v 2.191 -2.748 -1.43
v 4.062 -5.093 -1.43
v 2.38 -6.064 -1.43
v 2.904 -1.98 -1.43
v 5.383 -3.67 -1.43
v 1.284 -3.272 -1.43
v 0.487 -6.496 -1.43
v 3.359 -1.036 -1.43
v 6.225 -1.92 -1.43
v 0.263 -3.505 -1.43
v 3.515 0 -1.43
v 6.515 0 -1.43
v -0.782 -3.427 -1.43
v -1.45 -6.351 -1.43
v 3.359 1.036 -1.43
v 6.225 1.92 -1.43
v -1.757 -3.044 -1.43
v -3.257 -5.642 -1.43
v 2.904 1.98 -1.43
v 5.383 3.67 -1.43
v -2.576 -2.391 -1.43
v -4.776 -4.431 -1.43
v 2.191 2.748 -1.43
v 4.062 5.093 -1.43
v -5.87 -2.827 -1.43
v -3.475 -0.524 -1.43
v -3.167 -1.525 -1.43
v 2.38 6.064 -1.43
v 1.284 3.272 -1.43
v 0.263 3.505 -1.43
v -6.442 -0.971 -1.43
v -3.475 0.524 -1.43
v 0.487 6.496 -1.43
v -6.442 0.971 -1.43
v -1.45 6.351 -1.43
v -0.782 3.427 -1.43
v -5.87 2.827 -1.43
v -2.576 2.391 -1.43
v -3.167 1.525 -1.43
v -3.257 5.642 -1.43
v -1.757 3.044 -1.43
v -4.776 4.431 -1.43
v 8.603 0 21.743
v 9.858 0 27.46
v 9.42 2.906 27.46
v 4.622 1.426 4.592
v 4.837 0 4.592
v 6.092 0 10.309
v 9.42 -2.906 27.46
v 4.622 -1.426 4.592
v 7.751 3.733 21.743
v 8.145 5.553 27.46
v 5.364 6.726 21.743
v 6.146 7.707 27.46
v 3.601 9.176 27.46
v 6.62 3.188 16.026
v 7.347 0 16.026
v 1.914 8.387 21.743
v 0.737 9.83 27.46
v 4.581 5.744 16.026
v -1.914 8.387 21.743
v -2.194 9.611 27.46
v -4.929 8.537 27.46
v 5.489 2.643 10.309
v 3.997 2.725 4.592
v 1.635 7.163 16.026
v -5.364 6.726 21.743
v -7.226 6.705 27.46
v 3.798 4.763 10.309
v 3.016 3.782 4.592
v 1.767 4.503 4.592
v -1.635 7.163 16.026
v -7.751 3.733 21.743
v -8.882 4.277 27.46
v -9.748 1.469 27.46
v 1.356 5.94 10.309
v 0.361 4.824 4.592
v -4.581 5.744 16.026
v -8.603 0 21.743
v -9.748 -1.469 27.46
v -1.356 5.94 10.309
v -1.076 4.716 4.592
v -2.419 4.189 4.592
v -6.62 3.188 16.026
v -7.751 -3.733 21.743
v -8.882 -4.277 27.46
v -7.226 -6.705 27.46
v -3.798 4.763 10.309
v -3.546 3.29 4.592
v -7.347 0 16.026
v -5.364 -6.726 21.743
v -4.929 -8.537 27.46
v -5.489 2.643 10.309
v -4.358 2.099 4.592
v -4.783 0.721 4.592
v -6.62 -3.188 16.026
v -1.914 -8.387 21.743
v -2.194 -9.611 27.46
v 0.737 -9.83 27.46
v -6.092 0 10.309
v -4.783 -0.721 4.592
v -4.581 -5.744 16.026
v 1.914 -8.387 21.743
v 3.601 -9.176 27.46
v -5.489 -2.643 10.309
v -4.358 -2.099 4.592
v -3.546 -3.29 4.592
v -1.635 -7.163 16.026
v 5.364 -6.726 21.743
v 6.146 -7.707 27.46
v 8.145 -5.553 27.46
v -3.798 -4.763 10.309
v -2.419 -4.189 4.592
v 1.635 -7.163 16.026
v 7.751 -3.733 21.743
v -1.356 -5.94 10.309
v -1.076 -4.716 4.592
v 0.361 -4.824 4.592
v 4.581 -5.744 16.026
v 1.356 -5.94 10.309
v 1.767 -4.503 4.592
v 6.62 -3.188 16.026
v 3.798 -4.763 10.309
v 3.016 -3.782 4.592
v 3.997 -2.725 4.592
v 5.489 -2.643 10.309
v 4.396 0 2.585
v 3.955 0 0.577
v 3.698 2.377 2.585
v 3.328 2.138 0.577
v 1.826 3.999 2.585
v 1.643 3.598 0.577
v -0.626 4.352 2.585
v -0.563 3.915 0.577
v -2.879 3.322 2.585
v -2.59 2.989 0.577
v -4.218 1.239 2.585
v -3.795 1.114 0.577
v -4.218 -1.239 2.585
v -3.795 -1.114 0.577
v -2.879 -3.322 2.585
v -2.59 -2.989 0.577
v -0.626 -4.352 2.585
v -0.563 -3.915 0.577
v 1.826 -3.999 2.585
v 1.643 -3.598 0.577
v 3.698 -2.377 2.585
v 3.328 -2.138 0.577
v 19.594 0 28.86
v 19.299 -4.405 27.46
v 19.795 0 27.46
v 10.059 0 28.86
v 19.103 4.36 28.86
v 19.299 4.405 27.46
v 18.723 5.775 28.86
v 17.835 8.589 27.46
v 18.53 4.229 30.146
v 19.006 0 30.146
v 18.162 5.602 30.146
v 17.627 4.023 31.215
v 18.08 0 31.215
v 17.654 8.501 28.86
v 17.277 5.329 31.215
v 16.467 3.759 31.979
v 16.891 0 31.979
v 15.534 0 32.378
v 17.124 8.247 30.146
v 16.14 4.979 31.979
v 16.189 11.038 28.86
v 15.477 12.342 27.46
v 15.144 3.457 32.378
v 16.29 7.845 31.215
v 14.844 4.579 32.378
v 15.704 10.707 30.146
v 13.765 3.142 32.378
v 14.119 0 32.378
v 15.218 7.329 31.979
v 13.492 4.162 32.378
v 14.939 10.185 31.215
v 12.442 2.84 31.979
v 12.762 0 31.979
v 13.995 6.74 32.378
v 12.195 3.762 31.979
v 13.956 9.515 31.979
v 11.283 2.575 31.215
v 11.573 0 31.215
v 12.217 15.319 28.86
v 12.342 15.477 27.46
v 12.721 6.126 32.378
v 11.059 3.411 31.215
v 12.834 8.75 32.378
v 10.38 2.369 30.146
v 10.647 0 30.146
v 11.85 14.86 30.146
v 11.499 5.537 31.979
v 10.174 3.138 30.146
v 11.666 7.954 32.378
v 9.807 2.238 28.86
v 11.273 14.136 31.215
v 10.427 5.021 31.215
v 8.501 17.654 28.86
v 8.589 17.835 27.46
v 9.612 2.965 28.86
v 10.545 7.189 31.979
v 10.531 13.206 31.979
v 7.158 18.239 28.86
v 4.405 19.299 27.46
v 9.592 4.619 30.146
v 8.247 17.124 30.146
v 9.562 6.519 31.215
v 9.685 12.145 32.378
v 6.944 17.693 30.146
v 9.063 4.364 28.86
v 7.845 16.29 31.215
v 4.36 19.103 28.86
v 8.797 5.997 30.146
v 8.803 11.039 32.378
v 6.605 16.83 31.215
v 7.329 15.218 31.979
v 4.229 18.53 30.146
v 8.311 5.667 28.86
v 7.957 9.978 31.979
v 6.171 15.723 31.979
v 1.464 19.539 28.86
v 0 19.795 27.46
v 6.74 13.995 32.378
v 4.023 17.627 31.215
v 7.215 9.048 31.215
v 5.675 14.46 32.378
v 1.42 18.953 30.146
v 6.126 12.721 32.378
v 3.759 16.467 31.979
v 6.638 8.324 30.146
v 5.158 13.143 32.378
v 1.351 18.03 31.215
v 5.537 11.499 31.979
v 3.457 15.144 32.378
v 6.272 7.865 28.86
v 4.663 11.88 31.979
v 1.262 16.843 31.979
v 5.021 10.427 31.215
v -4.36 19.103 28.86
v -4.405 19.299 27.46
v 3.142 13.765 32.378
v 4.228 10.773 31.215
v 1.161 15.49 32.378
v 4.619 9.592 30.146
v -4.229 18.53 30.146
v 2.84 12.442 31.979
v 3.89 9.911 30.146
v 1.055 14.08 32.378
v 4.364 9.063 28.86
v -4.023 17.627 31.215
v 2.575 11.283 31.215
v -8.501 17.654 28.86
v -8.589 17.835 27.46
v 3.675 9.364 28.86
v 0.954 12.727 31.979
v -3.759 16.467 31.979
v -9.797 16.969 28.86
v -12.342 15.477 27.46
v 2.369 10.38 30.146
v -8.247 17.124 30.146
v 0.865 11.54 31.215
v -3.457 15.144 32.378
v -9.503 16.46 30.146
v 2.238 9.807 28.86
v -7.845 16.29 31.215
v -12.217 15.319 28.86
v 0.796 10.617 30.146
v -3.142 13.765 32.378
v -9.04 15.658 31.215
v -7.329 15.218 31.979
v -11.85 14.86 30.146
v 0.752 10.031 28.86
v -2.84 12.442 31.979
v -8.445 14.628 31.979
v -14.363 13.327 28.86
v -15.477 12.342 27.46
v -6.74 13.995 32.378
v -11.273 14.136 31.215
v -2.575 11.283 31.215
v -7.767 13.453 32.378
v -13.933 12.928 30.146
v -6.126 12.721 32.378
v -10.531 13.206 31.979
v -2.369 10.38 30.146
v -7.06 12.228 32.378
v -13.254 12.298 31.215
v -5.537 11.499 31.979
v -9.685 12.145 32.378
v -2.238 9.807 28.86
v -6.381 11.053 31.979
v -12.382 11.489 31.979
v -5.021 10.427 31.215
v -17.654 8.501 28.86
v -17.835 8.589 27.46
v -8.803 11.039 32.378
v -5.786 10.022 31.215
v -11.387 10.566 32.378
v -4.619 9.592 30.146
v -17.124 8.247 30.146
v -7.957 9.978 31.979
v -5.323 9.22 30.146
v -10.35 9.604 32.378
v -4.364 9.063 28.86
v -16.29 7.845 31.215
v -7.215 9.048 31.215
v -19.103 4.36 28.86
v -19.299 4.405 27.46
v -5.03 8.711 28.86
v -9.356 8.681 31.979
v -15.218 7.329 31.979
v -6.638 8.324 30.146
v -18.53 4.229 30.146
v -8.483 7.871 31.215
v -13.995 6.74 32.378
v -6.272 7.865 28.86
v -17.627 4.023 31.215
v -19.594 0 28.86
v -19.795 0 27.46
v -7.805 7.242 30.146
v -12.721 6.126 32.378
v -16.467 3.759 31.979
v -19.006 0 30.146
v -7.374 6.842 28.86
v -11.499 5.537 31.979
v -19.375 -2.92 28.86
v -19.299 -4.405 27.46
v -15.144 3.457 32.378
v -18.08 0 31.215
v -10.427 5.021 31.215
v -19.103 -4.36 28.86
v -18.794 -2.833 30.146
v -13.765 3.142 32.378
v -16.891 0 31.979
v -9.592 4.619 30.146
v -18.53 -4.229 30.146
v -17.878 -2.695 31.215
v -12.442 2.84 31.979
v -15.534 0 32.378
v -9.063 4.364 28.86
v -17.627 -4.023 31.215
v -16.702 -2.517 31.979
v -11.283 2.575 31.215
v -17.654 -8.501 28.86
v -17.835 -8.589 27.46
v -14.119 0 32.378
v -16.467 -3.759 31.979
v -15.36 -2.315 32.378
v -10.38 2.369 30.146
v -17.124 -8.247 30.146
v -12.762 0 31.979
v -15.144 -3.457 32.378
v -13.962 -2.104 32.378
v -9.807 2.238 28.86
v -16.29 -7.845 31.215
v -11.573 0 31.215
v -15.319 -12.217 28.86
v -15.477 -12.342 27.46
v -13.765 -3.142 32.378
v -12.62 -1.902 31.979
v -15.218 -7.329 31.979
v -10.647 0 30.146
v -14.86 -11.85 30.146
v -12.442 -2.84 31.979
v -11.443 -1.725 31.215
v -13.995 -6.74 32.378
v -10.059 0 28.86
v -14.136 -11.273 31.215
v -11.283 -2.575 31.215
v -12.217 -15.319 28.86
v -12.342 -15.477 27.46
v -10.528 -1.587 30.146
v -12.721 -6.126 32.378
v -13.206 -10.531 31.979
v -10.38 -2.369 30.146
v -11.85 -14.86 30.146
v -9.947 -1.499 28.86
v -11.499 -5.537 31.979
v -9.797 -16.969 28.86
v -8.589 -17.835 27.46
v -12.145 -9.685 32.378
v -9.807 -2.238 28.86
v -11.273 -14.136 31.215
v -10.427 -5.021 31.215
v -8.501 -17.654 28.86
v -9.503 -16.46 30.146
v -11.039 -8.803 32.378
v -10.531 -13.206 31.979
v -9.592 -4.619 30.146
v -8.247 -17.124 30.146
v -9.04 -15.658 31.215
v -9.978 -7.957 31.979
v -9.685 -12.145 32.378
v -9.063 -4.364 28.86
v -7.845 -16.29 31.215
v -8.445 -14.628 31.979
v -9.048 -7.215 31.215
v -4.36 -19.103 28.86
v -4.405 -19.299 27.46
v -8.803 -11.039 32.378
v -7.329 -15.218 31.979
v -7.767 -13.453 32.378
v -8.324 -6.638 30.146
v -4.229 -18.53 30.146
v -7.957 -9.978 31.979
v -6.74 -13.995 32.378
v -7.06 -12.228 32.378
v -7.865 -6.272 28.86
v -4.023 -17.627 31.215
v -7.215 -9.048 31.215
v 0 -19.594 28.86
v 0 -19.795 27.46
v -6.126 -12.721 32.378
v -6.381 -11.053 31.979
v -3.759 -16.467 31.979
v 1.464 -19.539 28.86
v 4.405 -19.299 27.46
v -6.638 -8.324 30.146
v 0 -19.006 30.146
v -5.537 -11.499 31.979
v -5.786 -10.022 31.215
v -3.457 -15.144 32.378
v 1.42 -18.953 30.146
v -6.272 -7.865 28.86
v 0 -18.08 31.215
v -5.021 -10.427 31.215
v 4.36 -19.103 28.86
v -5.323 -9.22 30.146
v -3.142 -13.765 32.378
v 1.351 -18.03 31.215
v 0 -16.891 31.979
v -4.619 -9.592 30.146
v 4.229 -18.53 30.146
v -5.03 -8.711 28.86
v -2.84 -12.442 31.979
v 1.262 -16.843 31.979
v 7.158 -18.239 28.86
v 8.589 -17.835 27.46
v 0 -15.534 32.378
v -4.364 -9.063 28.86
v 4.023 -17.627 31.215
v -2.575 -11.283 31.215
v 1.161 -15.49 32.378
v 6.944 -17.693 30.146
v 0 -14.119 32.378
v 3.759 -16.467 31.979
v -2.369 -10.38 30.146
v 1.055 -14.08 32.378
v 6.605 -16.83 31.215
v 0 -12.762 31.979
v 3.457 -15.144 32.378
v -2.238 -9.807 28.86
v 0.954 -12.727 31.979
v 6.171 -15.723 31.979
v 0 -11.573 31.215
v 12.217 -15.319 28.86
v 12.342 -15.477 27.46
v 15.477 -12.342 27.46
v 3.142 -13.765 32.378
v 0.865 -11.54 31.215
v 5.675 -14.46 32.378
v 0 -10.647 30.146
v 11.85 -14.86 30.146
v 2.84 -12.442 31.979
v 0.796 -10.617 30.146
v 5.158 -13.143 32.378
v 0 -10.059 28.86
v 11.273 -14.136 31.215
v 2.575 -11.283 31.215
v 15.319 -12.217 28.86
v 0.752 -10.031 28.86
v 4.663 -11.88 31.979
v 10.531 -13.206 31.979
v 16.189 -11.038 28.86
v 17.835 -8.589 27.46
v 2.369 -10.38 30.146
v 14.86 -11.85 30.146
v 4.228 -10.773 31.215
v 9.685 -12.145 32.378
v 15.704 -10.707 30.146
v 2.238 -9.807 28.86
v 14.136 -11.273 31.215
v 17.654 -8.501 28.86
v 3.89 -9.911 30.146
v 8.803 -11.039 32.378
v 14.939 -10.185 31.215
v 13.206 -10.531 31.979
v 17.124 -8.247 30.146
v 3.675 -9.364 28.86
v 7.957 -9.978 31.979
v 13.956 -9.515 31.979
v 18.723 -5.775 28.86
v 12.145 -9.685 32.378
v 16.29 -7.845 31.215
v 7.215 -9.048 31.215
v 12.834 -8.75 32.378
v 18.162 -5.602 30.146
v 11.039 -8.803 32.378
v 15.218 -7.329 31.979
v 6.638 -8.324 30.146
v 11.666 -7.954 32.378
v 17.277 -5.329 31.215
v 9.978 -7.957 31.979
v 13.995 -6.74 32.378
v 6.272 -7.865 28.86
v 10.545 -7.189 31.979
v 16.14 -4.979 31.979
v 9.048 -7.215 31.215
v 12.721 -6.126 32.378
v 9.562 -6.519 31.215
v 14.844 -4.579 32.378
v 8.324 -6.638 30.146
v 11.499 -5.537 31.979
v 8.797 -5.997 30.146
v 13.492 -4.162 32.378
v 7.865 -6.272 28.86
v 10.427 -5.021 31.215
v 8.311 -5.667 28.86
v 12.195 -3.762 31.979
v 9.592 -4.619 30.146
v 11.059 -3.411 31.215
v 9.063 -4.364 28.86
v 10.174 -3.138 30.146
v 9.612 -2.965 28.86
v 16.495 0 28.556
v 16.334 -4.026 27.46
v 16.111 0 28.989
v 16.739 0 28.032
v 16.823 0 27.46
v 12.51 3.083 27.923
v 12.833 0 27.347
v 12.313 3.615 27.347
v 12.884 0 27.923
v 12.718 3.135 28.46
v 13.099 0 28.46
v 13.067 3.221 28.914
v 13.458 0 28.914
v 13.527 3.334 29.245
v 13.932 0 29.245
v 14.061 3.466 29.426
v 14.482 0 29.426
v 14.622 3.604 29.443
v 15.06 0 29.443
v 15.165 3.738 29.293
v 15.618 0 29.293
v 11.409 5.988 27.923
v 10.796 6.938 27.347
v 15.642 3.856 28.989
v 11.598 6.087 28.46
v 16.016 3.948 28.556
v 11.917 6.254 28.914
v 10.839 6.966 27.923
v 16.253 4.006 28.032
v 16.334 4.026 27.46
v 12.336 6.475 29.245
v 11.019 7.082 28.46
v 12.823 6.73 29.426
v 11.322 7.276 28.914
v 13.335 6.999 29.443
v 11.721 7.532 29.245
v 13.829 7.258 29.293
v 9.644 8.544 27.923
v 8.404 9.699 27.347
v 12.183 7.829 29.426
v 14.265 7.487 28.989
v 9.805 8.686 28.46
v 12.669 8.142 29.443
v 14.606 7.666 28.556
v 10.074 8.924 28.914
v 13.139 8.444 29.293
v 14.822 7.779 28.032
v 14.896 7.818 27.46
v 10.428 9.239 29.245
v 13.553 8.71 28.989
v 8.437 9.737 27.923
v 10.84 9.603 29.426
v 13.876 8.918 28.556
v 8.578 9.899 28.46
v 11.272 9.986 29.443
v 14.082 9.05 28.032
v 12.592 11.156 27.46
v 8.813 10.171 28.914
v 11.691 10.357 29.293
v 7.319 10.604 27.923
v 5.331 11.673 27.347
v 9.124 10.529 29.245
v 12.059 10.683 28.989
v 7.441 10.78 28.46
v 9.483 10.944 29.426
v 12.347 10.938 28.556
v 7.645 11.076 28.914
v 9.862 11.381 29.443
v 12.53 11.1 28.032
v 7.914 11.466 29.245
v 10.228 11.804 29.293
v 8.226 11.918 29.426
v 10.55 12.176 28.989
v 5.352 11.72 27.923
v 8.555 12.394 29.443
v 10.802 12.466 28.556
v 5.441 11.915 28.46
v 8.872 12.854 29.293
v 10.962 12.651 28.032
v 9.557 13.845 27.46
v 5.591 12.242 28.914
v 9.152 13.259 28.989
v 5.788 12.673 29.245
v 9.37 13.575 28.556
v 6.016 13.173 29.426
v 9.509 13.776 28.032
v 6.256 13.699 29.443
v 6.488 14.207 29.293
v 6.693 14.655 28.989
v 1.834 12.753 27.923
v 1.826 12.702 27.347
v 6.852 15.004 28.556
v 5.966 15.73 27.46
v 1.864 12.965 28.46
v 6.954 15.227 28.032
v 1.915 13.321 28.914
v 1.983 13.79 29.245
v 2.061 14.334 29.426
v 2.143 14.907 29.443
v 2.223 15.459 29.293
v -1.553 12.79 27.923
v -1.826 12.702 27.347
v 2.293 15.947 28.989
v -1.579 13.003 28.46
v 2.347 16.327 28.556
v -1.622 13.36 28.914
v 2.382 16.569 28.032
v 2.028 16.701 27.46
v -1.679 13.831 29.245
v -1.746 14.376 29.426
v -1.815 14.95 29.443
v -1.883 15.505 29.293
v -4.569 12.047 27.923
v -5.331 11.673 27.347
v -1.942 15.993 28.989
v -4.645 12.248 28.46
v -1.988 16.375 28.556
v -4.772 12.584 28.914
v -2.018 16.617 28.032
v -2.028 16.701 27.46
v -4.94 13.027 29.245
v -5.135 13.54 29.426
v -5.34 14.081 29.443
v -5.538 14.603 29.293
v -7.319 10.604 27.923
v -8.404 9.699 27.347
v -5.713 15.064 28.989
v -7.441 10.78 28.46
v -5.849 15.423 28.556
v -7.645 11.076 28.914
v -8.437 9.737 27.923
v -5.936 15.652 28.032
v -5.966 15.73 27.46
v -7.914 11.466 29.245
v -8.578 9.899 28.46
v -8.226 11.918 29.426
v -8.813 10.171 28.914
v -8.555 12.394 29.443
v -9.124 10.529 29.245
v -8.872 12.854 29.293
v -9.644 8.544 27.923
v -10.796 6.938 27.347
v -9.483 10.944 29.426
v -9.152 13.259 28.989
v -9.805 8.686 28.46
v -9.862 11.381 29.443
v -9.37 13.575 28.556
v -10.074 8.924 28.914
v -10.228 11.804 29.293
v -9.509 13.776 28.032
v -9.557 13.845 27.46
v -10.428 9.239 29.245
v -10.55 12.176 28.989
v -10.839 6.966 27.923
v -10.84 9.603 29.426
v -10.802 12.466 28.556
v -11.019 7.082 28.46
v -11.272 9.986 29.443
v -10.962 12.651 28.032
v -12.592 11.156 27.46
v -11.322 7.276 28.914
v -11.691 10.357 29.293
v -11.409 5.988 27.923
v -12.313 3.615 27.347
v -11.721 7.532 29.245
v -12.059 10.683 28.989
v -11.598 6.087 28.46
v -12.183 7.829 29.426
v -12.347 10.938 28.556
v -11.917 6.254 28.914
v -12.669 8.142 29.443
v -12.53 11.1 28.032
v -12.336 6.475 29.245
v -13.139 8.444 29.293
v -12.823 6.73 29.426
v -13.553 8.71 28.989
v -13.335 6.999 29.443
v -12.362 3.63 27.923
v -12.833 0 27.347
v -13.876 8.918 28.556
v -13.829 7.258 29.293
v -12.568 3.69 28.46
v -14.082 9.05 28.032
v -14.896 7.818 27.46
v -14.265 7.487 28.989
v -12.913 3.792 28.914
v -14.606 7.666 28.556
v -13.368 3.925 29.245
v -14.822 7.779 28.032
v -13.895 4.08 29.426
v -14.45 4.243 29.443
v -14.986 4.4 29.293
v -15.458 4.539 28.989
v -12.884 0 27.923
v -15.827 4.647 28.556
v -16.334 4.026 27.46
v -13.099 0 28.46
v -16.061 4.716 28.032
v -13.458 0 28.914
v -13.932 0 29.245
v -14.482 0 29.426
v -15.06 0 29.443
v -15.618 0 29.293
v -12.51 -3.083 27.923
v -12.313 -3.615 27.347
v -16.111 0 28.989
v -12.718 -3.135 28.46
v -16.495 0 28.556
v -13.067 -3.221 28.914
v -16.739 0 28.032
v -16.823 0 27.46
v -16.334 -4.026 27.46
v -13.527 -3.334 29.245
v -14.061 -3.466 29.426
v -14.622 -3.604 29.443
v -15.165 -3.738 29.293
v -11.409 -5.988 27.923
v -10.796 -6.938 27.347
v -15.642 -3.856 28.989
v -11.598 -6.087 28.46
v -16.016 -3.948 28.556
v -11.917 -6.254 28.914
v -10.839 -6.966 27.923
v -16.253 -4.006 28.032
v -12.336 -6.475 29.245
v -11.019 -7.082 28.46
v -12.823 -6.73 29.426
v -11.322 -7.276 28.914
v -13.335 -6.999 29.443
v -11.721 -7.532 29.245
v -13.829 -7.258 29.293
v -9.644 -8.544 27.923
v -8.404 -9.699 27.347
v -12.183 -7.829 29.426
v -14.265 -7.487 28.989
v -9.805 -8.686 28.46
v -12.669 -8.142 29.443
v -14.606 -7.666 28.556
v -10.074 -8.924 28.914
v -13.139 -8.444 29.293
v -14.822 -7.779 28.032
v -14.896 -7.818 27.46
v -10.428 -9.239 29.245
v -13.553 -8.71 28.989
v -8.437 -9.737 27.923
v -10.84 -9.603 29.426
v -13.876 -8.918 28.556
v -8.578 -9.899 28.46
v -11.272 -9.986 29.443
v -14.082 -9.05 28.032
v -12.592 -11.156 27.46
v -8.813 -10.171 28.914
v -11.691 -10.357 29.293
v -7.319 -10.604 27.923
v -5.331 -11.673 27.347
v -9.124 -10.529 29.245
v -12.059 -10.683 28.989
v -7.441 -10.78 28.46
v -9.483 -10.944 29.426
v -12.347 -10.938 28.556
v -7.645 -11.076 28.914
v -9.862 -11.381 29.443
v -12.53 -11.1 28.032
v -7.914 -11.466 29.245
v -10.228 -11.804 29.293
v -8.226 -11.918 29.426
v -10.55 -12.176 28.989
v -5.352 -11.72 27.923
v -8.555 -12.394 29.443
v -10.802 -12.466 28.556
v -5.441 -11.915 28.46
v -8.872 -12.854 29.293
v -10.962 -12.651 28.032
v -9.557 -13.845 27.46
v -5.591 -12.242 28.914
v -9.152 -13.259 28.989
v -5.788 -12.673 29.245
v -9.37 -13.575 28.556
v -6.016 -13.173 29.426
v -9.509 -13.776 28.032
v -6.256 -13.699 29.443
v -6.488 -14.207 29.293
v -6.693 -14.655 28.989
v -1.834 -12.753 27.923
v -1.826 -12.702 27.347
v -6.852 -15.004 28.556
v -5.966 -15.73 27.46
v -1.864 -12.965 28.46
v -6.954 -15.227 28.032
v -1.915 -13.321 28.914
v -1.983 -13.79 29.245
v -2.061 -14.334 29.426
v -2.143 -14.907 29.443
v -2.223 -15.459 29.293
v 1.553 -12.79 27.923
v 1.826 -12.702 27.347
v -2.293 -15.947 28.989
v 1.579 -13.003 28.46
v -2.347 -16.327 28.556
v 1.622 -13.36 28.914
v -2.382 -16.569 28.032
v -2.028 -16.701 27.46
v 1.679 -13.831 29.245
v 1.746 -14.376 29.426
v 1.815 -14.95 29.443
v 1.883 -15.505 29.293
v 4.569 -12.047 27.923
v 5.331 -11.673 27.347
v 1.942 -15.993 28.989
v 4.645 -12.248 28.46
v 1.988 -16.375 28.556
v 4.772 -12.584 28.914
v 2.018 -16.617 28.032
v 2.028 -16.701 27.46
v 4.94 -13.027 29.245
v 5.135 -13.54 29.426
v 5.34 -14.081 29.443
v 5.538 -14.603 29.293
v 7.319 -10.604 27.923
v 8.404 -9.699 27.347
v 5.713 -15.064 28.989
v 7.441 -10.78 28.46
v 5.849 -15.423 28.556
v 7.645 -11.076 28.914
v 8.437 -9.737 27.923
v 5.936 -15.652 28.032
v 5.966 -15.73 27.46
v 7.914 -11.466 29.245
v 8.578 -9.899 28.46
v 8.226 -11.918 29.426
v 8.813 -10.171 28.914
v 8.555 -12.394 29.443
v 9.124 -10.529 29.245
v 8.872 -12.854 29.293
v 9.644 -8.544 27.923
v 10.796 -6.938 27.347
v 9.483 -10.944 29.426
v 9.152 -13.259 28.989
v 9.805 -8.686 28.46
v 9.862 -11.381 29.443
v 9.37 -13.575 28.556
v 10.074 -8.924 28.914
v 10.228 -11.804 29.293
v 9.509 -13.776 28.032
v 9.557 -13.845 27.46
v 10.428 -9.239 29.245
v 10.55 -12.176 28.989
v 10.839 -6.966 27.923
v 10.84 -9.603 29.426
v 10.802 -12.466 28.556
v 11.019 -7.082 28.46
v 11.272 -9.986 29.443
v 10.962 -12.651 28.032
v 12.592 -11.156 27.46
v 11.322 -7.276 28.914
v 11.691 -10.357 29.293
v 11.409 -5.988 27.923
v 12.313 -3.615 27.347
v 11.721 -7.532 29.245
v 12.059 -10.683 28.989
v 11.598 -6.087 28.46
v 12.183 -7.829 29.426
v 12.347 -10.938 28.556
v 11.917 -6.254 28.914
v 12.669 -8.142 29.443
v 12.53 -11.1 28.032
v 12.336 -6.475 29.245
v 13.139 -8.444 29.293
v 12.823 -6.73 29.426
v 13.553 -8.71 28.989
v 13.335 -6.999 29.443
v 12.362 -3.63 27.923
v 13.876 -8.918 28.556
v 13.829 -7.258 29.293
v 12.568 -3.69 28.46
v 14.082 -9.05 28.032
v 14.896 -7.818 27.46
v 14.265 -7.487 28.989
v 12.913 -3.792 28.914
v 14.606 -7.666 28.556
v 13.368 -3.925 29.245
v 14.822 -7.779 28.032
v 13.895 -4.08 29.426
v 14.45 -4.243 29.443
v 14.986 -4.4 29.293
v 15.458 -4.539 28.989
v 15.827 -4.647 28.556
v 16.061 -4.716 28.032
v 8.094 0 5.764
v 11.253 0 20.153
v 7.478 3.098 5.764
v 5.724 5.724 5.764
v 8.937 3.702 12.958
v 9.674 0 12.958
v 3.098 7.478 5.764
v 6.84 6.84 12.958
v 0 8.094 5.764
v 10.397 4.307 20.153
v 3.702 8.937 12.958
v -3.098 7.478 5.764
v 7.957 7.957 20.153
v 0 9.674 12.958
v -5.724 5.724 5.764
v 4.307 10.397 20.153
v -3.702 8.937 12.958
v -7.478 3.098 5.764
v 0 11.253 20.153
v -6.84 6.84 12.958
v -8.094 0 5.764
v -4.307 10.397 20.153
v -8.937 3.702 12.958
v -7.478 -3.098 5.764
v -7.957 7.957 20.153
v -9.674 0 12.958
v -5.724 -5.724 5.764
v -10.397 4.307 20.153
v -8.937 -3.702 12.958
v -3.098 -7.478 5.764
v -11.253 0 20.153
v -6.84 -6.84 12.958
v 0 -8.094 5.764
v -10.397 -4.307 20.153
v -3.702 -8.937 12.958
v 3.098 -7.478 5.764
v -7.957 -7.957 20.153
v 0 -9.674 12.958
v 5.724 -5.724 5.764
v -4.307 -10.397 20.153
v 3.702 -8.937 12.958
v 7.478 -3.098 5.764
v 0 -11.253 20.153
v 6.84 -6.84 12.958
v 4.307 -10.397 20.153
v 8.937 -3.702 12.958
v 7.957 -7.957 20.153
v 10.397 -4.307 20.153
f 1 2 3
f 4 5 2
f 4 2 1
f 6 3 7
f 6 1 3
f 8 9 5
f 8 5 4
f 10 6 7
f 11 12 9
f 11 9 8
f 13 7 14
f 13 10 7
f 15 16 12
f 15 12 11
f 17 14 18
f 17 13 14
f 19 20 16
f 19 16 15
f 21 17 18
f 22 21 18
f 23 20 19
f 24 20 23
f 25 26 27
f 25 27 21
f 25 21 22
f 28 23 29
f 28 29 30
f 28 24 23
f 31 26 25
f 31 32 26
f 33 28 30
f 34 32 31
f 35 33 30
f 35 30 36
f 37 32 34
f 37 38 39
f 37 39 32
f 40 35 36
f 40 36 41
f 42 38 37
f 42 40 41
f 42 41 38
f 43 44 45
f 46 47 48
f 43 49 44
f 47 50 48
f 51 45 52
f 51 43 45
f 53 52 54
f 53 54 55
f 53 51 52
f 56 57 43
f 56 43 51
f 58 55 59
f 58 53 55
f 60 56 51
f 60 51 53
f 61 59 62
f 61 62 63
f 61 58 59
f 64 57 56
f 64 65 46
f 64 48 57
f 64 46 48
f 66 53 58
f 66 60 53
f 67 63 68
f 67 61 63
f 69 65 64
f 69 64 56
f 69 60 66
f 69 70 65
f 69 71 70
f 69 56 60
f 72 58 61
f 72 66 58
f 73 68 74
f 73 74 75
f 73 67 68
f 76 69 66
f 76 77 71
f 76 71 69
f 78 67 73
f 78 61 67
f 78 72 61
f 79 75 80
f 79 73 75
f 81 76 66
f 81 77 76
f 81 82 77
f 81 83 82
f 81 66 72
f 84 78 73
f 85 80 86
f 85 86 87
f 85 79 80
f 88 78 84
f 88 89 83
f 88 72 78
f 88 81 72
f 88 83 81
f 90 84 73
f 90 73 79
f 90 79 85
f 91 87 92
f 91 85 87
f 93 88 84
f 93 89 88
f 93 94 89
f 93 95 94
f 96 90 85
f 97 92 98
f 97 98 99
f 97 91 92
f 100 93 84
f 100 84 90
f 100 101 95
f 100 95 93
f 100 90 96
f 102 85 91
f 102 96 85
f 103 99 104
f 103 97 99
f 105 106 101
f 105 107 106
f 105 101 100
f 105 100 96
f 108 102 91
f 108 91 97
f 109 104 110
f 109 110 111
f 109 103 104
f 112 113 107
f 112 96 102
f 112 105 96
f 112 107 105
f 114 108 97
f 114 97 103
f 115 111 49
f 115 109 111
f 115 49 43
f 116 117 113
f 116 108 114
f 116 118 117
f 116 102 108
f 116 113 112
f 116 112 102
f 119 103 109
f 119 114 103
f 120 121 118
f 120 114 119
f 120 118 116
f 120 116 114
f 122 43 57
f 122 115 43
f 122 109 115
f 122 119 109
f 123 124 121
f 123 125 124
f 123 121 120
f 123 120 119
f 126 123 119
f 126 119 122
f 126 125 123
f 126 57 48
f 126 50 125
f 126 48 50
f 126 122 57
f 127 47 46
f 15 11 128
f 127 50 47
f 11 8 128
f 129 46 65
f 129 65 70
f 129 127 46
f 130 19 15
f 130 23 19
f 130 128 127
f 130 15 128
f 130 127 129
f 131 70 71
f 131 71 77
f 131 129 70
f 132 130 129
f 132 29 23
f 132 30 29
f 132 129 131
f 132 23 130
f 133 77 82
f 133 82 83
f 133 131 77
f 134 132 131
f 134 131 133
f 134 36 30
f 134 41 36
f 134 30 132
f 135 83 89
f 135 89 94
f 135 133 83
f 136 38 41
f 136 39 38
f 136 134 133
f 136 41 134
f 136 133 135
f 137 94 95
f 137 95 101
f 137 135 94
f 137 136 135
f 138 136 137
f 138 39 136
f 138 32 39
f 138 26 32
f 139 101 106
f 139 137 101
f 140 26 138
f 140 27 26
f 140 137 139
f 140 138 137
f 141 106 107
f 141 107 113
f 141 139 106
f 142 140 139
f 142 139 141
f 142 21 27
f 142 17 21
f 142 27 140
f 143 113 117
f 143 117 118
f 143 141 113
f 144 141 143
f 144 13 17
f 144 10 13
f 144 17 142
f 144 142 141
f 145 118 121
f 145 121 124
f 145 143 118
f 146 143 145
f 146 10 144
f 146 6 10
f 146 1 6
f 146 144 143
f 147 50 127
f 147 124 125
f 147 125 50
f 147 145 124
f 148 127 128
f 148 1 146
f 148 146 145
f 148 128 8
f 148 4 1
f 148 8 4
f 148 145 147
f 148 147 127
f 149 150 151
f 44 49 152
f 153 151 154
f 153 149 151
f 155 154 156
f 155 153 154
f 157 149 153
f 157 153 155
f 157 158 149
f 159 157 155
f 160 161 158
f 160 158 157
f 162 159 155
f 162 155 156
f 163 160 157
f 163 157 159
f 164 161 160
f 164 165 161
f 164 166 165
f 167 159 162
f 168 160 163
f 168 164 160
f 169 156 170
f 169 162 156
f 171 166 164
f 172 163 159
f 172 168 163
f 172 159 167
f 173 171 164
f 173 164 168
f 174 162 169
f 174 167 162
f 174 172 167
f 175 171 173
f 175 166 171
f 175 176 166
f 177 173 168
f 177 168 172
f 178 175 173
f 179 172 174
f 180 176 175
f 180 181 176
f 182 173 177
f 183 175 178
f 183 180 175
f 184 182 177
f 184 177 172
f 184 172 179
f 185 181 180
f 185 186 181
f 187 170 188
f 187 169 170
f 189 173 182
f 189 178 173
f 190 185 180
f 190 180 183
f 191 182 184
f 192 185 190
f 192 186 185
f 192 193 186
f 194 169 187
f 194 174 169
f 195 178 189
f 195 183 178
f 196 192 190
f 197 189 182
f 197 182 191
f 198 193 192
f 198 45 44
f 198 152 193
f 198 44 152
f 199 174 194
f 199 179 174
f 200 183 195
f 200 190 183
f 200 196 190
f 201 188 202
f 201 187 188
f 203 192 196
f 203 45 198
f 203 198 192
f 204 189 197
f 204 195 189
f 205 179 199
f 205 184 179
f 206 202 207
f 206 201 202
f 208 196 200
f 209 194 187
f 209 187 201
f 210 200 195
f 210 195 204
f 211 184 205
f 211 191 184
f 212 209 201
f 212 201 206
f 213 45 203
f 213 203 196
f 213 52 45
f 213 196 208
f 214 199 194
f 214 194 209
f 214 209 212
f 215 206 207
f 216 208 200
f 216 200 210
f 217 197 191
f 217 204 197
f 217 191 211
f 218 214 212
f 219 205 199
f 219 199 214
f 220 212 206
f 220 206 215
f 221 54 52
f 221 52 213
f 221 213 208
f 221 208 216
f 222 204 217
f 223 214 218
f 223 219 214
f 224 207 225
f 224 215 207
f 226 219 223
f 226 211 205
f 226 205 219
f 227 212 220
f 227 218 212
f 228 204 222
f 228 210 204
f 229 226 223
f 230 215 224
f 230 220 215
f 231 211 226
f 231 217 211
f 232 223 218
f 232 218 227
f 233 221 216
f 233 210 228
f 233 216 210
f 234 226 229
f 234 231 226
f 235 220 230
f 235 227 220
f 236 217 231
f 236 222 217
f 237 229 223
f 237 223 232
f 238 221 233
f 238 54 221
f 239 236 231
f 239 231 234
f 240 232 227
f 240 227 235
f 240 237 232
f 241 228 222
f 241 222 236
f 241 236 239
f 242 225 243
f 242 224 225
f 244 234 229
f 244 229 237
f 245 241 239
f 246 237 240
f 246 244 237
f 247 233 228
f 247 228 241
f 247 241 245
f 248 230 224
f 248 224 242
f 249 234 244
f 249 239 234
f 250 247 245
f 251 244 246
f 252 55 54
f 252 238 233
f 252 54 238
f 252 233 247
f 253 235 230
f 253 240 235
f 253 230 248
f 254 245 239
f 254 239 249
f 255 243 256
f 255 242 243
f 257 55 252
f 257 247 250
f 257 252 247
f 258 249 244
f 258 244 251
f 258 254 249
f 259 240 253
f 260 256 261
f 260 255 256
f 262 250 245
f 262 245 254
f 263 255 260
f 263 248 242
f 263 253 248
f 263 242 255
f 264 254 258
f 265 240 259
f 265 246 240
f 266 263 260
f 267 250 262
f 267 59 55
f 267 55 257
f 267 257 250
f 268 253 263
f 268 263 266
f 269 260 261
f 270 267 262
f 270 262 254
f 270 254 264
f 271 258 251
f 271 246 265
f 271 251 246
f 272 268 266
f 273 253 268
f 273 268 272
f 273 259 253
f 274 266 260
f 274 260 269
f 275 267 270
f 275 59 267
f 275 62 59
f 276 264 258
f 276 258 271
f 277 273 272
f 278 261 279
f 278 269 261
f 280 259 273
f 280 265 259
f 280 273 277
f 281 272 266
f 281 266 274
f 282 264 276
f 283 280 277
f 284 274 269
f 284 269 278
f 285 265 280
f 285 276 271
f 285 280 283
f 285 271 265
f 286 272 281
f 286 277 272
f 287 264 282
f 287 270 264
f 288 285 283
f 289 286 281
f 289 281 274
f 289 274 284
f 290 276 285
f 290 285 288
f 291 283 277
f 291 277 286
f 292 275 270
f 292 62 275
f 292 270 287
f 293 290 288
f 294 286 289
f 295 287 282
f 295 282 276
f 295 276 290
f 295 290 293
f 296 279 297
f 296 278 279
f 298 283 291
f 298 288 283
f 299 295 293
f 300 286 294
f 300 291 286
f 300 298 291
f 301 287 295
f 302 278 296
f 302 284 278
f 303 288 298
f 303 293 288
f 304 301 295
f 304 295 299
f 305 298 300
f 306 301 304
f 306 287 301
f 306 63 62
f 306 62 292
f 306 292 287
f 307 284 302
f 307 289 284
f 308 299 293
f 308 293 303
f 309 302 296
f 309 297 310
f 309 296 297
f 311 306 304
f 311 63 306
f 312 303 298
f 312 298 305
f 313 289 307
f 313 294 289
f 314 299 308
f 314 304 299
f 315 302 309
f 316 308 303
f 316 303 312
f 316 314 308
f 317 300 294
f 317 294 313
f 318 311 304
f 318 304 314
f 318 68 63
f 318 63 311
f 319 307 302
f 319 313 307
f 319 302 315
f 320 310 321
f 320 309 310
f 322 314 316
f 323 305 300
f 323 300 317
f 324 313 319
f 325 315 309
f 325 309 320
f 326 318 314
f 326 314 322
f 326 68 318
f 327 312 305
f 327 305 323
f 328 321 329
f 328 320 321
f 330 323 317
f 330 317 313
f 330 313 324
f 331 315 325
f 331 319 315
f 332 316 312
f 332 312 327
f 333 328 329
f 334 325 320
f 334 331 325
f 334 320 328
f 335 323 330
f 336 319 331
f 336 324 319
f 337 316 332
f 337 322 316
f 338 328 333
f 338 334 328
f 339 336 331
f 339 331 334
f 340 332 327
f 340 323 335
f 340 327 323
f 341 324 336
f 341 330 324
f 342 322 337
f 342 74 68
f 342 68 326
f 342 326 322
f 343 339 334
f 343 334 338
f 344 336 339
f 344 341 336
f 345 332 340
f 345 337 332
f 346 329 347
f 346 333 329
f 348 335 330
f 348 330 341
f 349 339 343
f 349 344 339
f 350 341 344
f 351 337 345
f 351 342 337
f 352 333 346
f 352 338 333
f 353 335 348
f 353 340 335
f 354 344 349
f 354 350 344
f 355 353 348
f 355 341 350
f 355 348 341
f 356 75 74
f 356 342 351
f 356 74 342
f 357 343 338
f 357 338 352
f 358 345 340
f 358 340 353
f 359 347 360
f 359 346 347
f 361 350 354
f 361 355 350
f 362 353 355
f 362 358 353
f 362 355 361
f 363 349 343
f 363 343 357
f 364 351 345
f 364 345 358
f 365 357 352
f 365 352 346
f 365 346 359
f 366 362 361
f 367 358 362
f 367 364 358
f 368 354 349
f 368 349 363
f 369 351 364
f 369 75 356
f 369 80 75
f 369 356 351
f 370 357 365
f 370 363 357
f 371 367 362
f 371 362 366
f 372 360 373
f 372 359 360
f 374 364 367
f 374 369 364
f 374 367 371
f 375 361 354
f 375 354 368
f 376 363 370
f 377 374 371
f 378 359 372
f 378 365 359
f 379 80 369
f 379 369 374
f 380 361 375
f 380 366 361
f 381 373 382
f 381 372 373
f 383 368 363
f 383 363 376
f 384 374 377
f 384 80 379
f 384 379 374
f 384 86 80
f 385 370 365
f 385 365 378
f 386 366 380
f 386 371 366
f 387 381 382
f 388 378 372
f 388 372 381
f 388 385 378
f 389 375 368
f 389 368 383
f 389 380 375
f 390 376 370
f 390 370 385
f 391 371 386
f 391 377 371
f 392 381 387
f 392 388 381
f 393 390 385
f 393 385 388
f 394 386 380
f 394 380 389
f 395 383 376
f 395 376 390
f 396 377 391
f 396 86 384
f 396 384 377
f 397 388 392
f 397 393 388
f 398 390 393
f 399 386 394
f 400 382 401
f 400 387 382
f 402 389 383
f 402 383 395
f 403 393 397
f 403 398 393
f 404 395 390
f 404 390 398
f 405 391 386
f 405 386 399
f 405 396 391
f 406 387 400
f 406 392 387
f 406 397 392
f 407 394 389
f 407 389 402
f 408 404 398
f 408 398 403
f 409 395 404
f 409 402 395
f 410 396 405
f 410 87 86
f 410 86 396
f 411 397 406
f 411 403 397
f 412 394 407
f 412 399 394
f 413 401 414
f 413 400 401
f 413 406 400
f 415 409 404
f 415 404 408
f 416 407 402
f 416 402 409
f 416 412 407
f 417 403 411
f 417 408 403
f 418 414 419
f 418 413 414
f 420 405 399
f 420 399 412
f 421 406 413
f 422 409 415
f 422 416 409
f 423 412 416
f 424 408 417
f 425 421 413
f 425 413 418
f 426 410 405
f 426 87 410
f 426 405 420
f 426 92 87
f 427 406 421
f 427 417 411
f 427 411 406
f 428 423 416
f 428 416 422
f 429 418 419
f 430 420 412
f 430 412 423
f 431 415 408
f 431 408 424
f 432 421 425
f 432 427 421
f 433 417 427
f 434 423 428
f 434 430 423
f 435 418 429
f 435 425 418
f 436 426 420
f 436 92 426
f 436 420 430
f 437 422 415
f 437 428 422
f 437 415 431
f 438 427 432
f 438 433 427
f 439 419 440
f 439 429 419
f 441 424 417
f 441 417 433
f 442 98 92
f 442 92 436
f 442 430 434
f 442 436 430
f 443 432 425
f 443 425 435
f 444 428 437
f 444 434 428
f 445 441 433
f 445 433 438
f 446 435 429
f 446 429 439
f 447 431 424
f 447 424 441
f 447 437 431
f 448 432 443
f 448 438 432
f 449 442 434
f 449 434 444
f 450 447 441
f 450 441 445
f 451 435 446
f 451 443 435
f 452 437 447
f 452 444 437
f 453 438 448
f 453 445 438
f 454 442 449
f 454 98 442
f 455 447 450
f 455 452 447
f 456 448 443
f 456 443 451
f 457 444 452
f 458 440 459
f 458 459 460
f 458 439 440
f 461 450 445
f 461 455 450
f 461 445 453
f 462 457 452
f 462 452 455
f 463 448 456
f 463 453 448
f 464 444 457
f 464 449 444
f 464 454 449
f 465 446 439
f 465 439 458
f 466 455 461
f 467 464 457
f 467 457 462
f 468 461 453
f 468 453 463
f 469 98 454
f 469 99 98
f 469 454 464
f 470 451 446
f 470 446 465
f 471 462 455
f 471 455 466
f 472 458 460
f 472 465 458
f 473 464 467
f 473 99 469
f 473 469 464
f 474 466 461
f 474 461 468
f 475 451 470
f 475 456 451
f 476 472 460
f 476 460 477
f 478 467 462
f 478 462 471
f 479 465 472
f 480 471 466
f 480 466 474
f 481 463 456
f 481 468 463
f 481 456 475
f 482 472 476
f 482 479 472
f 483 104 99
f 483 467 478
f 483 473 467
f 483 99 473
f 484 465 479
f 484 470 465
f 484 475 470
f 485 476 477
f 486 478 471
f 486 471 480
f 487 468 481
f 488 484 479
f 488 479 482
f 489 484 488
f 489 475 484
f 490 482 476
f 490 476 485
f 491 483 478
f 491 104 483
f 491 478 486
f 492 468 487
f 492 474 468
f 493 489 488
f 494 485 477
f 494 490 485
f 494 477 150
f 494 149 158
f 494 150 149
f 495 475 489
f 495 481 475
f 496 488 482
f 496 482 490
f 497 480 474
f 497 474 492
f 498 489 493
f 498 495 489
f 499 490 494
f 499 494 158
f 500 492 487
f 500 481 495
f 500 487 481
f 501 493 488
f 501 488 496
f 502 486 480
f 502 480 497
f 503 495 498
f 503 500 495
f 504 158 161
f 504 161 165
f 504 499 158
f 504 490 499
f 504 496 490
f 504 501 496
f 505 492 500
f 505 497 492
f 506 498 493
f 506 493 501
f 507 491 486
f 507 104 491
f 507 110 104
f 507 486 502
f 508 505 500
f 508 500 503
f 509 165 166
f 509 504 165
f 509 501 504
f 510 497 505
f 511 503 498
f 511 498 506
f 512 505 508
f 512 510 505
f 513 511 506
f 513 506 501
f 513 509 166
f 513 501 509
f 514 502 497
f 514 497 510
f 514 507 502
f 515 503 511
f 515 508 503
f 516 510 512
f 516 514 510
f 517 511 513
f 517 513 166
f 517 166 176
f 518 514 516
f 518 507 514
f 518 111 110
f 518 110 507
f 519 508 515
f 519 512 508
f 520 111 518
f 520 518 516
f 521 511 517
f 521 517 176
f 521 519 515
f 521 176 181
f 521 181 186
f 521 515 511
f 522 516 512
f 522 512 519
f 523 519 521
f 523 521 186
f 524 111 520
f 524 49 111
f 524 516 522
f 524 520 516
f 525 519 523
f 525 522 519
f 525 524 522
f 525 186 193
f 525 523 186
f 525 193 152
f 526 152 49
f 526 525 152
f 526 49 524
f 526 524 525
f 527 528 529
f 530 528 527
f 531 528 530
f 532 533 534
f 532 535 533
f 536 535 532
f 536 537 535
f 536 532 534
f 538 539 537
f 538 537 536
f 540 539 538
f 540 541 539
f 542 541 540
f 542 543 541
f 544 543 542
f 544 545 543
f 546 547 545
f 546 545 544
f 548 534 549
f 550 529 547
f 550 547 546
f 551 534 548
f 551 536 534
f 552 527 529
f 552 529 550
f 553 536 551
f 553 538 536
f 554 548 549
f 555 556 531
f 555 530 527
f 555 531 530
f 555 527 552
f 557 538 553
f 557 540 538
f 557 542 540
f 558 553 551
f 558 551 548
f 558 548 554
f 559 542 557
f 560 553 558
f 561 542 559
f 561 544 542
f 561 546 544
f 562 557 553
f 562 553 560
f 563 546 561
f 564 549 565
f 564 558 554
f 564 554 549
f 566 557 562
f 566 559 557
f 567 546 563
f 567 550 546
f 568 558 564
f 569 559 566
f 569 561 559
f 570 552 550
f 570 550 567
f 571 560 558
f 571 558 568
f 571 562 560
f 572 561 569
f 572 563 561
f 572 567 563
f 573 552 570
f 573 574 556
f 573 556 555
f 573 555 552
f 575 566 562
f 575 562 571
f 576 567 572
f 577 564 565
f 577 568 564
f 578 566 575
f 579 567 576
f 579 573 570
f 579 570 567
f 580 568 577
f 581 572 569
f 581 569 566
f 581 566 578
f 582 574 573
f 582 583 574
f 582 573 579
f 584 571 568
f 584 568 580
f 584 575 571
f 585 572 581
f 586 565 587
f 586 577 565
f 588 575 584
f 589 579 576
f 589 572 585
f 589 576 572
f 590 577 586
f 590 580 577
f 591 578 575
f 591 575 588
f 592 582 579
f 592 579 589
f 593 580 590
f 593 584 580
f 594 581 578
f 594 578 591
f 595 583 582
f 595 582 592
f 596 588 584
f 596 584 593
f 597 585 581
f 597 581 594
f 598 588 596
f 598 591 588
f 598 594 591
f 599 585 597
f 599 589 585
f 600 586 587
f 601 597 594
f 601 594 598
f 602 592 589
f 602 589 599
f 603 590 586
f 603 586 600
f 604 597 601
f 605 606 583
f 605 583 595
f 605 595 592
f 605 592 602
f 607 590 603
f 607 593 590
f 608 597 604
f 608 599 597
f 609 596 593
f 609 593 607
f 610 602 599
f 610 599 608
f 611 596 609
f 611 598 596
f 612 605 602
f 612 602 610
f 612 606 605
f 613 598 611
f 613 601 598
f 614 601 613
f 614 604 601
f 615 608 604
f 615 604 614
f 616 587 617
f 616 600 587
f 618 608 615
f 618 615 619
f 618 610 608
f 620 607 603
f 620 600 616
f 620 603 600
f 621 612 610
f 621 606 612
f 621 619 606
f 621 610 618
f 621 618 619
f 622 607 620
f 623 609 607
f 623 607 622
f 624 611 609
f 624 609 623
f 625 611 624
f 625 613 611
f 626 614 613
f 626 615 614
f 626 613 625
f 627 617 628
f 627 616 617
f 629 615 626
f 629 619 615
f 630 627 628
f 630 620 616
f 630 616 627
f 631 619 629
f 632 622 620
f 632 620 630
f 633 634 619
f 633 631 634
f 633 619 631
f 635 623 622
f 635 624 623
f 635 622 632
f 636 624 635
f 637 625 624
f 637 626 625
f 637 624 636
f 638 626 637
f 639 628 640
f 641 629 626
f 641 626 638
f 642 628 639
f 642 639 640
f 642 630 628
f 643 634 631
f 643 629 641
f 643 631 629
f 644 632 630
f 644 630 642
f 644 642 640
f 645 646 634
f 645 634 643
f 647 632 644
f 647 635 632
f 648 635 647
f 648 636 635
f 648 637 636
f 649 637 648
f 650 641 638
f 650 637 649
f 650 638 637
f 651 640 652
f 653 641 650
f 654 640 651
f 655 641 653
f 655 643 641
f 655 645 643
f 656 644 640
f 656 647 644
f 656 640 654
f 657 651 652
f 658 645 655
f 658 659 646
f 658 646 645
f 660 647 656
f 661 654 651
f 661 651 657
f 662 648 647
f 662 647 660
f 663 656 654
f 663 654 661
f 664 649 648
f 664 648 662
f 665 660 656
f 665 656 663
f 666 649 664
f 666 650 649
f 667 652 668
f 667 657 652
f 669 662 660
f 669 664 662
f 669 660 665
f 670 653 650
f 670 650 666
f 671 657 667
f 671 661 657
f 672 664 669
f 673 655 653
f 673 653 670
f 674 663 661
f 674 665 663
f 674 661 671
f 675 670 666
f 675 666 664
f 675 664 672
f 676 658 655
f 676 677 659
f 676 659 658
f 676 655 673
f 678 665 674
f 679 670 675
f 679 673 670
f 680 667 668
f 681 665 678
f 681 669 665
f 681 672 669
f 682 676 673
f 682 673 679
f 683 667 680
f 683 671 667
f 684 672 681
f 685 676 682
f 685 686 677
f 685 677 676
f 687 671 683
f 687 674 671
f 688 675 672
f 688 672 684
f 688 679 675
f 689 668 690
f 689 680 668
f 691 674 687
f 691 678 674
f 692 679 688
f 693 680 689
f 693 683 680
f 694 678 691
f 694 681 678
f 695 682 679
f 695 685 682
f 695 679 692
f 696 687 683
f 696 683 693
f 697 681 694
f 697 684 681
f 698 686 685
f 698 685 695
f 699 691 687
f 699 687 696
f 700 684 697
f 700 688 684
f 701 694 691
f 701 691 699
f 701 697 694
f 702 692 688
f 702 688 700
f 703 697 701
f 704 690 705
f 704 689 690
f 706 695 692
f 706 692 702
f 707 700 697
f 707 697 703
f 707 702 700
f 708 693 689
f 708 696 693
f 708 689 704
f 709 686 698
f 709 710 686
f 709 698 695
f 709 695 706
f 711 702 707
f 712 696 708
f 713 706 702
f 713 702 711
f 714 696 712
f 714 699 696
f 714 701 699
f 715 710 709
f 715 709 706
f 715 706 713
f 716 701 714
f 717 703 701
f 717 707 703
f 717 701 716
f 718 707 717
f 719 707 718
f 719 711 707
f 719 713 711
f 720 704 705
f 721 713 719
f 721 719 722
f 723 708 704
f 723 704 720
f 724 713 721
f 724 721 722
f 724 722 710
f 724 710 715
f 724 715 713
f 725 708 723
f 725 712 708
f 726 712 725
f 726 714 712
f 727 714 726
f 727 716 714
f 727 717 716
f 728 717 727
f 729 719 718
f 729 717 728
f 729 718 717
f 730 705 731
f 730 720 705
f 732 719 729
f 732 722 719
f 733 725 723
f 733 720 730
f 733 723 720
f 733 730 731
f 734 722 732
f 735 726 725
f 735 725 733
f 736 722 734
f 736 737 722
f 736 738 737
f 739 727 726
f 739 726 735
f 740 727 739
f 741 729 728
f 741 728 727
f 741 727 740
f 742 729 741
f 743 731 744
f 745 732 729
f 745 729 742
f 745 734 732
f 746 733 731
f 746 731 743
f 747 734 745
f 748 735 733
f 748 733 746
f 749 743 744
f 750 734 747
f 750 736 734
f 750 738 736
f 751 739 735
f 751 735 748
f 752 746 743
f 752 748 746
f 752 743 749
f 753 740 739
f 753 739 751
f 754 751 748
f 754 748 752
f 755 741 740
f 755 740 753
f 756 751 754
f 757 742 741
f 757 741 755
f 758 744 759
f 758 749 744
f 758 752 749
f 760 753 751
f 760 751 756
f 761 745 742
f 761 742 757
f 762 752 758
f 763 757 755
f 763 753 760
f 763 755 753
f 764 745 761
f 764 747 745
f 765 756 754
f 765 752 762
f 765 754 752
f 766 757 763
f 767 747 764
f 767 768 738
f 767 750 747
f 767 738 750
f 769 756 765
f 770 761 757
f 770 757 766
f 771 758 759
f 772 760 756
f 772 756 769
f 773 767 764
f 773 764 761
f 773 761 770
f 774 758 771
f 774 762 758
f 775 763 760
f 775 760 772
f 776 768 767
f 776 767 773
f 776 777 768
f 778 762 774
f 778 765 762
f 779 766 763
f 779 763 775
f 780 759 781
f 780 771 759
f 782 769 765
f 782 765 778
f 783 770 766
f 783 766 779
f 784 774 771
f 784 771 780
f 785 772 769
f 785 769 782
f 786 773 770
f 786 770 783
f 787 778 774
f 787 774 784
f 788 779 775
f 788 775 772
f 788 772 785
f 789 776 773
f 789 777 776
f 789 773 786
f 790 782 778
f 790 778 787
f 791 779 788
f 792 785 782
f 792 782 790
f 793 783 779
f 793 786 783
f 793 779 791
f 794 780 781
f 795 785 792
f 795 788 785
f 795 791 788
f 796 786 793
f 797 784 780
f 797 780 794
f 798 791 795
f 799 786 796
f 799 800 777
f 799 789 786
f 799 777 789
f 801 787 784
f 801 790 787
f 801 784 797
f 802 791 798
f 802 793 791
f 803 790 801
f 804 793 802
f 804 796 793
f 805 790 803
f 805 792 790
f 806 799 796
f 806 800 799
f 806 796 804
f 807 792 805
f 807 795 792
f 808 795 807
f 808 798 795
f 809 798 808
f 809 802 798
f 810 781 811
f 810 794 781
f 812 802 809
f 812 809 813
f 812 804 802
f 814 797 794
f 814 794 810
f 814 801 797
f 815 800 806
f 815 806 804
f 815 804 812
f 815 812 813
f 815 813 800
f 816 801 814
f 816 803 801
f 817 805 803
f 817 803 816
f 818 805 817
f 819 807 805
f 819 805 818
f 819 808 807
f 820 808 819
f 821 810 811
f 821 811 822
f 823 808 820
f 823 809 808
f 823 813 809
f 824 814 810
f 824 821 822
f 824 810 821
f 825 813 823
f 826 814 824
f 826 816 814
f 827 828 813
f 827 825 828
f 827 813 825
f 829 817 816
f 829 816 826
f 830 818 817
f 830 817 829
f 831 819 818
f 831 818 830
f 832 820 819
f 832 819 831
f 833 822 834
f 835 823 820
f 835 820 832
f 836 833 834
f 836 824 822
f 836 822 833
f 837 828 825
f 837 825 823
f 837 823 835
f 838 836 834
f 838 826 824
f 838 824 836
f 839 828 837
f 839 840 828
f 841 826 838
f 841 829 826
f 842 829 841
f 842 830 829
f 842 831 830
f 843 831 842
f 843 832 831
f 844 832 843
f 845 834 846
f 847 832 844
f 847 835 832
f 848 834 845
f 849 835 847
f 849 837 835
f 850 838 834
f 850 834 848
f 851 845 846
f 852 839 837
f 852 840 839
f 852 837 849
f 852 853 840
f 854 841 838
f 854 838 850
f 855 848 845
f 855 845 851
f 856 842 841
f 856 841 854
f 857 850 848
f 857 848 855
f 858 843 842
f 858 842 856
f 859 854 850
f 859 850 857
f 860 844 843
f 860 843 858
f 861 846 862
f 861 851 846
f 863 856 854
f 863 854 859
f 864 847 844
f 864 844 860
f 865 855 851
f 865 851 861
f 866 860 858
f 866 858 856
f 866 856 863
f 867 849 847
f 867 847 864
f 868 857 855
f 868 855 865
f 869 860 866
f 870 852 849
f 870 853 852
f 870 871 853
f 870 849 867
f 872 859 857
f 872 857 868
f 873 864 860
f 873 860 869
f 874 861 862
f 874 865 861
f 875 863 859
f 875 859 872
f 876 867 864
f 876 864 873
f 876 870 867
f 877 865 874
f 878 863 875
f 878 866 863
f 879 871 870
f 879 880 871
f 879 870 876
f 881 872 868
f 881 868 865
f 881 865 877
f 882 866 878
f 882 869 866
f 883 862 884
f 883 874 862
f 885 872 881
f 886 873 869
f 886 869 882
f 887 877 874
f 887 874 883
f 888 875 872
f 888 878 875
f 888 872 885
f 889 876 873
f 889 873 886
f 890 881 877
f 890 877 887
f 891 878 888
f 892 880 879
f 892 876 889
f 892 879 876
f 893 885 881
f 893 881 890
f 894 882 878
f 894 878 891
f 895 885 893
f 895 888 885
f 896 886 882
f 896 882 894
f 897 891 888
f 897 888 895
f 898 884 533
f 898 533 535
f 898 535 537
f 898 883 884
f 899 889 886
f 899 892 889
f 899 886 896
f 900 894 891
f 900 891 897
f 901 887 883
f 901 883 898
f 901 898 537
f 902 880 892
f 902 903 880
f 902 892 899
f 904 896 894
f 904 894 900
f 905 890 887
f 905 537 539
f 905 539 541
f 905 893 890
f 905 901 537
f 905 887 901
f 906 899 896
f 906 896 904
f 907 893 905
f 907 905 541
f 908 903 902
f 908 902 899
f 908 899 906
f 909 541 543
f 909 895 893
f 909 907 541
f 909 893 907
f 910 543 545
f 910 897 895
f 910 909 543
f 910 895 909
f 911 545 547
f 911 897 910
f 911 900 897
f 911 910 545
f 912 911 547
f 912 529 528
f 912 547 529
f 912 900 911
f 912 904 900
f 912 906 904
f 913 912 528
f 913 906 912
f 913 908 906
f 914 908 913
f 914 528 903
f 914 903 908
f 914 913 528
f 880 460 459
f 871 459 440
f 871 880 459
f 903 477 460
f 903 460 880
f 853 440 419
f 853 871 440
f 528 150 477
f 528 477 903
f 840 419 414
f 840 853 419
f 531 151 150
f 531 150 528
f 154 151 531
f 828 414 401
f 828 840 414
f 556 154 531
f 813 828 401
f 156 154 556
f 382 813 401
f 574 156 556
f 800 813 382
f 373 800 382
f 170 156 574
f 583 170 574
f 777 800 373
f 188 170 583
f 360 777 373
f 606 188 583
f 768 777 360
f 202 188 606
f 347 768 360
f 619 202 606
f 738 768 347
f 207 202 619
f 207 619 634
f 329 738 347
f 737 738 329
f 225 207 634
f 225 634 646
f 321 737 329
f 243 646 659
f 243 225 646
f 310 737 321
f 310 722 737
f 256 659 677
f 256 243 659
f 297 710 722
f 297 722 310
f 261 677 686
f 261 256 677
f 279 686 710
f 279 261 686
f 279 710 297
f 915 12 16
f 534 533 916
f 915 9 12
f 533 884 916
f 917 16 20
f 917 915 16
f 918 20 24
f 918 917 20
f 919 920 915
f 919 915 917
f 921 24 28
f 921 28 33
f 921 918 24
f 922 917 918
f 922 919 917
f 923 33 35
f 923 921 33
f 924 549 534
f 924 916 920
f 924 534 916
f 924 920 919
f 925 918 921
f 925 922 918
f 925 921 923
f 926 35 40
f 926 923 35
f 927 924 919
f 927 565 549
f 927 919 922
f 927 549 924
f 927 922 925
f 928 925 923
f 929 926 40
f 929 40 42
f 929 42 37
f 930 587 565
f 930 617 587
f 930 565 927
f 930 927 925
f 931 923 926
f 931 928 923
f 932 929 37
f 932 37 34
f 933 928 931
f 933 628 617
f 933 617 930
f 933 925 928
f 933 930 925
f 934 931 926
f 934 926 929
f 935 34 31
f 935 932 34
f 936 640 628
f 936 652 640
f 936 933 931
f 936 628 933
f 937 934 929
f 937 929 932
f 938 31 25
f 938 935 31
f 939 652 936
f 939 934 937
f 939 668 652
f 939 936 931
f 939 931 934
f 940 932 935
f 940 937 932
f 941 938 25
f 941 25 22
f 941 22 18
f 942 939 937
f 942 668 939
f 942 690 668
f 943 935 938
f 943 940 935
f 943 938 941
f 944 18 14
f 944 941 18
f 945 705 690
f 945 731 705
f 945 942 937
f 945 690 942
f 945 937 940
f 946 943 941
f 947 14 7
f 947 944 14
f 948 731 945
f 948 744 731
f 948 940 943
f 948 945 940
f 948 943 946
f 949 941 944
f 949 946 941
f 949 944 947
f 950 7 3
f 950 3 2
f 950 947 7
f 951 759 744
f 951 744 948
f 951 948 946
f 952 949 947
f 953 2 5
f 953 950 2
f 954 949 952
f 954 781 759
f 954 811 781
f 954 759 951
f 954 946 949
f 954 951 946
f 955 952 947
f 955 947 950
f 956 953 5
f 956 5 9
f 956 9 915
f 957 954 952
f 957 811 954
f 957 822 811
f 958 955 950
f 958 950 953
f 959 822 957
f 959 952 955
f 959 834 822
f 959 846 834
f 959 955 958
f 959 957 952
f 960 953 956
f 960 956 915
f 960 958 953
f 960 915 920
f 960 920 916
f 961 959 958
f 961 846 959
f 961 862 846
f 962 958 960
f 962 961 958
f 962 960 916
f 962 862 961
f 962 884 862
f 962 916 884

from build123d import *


with BuildPart() as f1:
    # F0 (on Front) → F1 (revolve)
    with BuildSketch(Plane.XZ):
        with BuildLine():
            Line((16.823175, 27.459773), (19.795203, 27.459773))
            ThreePointArc((19.795203, 27.459773), (14.826528, 32.428447), (9.857854, 27.459773))
            Line((9.857854, 27.459773), (4.83705, 4.592385))
            Line((4.83705, 4.592385), (3.514682, -1.430375))
            Line((3.514682, -1.430375), (6.514682, -1.430375))
            Line((6.514682, -1.430375), (12.833074, 27.346913))
            ThreePointArc((12.833074, 27.346913), (14.770076, 29.455621), (16.823175, 27.459773))
        make_face()
    revolve(axis=Axis((0, 0, 4.655987), (0, 0, 1)))


solid = f1.part
